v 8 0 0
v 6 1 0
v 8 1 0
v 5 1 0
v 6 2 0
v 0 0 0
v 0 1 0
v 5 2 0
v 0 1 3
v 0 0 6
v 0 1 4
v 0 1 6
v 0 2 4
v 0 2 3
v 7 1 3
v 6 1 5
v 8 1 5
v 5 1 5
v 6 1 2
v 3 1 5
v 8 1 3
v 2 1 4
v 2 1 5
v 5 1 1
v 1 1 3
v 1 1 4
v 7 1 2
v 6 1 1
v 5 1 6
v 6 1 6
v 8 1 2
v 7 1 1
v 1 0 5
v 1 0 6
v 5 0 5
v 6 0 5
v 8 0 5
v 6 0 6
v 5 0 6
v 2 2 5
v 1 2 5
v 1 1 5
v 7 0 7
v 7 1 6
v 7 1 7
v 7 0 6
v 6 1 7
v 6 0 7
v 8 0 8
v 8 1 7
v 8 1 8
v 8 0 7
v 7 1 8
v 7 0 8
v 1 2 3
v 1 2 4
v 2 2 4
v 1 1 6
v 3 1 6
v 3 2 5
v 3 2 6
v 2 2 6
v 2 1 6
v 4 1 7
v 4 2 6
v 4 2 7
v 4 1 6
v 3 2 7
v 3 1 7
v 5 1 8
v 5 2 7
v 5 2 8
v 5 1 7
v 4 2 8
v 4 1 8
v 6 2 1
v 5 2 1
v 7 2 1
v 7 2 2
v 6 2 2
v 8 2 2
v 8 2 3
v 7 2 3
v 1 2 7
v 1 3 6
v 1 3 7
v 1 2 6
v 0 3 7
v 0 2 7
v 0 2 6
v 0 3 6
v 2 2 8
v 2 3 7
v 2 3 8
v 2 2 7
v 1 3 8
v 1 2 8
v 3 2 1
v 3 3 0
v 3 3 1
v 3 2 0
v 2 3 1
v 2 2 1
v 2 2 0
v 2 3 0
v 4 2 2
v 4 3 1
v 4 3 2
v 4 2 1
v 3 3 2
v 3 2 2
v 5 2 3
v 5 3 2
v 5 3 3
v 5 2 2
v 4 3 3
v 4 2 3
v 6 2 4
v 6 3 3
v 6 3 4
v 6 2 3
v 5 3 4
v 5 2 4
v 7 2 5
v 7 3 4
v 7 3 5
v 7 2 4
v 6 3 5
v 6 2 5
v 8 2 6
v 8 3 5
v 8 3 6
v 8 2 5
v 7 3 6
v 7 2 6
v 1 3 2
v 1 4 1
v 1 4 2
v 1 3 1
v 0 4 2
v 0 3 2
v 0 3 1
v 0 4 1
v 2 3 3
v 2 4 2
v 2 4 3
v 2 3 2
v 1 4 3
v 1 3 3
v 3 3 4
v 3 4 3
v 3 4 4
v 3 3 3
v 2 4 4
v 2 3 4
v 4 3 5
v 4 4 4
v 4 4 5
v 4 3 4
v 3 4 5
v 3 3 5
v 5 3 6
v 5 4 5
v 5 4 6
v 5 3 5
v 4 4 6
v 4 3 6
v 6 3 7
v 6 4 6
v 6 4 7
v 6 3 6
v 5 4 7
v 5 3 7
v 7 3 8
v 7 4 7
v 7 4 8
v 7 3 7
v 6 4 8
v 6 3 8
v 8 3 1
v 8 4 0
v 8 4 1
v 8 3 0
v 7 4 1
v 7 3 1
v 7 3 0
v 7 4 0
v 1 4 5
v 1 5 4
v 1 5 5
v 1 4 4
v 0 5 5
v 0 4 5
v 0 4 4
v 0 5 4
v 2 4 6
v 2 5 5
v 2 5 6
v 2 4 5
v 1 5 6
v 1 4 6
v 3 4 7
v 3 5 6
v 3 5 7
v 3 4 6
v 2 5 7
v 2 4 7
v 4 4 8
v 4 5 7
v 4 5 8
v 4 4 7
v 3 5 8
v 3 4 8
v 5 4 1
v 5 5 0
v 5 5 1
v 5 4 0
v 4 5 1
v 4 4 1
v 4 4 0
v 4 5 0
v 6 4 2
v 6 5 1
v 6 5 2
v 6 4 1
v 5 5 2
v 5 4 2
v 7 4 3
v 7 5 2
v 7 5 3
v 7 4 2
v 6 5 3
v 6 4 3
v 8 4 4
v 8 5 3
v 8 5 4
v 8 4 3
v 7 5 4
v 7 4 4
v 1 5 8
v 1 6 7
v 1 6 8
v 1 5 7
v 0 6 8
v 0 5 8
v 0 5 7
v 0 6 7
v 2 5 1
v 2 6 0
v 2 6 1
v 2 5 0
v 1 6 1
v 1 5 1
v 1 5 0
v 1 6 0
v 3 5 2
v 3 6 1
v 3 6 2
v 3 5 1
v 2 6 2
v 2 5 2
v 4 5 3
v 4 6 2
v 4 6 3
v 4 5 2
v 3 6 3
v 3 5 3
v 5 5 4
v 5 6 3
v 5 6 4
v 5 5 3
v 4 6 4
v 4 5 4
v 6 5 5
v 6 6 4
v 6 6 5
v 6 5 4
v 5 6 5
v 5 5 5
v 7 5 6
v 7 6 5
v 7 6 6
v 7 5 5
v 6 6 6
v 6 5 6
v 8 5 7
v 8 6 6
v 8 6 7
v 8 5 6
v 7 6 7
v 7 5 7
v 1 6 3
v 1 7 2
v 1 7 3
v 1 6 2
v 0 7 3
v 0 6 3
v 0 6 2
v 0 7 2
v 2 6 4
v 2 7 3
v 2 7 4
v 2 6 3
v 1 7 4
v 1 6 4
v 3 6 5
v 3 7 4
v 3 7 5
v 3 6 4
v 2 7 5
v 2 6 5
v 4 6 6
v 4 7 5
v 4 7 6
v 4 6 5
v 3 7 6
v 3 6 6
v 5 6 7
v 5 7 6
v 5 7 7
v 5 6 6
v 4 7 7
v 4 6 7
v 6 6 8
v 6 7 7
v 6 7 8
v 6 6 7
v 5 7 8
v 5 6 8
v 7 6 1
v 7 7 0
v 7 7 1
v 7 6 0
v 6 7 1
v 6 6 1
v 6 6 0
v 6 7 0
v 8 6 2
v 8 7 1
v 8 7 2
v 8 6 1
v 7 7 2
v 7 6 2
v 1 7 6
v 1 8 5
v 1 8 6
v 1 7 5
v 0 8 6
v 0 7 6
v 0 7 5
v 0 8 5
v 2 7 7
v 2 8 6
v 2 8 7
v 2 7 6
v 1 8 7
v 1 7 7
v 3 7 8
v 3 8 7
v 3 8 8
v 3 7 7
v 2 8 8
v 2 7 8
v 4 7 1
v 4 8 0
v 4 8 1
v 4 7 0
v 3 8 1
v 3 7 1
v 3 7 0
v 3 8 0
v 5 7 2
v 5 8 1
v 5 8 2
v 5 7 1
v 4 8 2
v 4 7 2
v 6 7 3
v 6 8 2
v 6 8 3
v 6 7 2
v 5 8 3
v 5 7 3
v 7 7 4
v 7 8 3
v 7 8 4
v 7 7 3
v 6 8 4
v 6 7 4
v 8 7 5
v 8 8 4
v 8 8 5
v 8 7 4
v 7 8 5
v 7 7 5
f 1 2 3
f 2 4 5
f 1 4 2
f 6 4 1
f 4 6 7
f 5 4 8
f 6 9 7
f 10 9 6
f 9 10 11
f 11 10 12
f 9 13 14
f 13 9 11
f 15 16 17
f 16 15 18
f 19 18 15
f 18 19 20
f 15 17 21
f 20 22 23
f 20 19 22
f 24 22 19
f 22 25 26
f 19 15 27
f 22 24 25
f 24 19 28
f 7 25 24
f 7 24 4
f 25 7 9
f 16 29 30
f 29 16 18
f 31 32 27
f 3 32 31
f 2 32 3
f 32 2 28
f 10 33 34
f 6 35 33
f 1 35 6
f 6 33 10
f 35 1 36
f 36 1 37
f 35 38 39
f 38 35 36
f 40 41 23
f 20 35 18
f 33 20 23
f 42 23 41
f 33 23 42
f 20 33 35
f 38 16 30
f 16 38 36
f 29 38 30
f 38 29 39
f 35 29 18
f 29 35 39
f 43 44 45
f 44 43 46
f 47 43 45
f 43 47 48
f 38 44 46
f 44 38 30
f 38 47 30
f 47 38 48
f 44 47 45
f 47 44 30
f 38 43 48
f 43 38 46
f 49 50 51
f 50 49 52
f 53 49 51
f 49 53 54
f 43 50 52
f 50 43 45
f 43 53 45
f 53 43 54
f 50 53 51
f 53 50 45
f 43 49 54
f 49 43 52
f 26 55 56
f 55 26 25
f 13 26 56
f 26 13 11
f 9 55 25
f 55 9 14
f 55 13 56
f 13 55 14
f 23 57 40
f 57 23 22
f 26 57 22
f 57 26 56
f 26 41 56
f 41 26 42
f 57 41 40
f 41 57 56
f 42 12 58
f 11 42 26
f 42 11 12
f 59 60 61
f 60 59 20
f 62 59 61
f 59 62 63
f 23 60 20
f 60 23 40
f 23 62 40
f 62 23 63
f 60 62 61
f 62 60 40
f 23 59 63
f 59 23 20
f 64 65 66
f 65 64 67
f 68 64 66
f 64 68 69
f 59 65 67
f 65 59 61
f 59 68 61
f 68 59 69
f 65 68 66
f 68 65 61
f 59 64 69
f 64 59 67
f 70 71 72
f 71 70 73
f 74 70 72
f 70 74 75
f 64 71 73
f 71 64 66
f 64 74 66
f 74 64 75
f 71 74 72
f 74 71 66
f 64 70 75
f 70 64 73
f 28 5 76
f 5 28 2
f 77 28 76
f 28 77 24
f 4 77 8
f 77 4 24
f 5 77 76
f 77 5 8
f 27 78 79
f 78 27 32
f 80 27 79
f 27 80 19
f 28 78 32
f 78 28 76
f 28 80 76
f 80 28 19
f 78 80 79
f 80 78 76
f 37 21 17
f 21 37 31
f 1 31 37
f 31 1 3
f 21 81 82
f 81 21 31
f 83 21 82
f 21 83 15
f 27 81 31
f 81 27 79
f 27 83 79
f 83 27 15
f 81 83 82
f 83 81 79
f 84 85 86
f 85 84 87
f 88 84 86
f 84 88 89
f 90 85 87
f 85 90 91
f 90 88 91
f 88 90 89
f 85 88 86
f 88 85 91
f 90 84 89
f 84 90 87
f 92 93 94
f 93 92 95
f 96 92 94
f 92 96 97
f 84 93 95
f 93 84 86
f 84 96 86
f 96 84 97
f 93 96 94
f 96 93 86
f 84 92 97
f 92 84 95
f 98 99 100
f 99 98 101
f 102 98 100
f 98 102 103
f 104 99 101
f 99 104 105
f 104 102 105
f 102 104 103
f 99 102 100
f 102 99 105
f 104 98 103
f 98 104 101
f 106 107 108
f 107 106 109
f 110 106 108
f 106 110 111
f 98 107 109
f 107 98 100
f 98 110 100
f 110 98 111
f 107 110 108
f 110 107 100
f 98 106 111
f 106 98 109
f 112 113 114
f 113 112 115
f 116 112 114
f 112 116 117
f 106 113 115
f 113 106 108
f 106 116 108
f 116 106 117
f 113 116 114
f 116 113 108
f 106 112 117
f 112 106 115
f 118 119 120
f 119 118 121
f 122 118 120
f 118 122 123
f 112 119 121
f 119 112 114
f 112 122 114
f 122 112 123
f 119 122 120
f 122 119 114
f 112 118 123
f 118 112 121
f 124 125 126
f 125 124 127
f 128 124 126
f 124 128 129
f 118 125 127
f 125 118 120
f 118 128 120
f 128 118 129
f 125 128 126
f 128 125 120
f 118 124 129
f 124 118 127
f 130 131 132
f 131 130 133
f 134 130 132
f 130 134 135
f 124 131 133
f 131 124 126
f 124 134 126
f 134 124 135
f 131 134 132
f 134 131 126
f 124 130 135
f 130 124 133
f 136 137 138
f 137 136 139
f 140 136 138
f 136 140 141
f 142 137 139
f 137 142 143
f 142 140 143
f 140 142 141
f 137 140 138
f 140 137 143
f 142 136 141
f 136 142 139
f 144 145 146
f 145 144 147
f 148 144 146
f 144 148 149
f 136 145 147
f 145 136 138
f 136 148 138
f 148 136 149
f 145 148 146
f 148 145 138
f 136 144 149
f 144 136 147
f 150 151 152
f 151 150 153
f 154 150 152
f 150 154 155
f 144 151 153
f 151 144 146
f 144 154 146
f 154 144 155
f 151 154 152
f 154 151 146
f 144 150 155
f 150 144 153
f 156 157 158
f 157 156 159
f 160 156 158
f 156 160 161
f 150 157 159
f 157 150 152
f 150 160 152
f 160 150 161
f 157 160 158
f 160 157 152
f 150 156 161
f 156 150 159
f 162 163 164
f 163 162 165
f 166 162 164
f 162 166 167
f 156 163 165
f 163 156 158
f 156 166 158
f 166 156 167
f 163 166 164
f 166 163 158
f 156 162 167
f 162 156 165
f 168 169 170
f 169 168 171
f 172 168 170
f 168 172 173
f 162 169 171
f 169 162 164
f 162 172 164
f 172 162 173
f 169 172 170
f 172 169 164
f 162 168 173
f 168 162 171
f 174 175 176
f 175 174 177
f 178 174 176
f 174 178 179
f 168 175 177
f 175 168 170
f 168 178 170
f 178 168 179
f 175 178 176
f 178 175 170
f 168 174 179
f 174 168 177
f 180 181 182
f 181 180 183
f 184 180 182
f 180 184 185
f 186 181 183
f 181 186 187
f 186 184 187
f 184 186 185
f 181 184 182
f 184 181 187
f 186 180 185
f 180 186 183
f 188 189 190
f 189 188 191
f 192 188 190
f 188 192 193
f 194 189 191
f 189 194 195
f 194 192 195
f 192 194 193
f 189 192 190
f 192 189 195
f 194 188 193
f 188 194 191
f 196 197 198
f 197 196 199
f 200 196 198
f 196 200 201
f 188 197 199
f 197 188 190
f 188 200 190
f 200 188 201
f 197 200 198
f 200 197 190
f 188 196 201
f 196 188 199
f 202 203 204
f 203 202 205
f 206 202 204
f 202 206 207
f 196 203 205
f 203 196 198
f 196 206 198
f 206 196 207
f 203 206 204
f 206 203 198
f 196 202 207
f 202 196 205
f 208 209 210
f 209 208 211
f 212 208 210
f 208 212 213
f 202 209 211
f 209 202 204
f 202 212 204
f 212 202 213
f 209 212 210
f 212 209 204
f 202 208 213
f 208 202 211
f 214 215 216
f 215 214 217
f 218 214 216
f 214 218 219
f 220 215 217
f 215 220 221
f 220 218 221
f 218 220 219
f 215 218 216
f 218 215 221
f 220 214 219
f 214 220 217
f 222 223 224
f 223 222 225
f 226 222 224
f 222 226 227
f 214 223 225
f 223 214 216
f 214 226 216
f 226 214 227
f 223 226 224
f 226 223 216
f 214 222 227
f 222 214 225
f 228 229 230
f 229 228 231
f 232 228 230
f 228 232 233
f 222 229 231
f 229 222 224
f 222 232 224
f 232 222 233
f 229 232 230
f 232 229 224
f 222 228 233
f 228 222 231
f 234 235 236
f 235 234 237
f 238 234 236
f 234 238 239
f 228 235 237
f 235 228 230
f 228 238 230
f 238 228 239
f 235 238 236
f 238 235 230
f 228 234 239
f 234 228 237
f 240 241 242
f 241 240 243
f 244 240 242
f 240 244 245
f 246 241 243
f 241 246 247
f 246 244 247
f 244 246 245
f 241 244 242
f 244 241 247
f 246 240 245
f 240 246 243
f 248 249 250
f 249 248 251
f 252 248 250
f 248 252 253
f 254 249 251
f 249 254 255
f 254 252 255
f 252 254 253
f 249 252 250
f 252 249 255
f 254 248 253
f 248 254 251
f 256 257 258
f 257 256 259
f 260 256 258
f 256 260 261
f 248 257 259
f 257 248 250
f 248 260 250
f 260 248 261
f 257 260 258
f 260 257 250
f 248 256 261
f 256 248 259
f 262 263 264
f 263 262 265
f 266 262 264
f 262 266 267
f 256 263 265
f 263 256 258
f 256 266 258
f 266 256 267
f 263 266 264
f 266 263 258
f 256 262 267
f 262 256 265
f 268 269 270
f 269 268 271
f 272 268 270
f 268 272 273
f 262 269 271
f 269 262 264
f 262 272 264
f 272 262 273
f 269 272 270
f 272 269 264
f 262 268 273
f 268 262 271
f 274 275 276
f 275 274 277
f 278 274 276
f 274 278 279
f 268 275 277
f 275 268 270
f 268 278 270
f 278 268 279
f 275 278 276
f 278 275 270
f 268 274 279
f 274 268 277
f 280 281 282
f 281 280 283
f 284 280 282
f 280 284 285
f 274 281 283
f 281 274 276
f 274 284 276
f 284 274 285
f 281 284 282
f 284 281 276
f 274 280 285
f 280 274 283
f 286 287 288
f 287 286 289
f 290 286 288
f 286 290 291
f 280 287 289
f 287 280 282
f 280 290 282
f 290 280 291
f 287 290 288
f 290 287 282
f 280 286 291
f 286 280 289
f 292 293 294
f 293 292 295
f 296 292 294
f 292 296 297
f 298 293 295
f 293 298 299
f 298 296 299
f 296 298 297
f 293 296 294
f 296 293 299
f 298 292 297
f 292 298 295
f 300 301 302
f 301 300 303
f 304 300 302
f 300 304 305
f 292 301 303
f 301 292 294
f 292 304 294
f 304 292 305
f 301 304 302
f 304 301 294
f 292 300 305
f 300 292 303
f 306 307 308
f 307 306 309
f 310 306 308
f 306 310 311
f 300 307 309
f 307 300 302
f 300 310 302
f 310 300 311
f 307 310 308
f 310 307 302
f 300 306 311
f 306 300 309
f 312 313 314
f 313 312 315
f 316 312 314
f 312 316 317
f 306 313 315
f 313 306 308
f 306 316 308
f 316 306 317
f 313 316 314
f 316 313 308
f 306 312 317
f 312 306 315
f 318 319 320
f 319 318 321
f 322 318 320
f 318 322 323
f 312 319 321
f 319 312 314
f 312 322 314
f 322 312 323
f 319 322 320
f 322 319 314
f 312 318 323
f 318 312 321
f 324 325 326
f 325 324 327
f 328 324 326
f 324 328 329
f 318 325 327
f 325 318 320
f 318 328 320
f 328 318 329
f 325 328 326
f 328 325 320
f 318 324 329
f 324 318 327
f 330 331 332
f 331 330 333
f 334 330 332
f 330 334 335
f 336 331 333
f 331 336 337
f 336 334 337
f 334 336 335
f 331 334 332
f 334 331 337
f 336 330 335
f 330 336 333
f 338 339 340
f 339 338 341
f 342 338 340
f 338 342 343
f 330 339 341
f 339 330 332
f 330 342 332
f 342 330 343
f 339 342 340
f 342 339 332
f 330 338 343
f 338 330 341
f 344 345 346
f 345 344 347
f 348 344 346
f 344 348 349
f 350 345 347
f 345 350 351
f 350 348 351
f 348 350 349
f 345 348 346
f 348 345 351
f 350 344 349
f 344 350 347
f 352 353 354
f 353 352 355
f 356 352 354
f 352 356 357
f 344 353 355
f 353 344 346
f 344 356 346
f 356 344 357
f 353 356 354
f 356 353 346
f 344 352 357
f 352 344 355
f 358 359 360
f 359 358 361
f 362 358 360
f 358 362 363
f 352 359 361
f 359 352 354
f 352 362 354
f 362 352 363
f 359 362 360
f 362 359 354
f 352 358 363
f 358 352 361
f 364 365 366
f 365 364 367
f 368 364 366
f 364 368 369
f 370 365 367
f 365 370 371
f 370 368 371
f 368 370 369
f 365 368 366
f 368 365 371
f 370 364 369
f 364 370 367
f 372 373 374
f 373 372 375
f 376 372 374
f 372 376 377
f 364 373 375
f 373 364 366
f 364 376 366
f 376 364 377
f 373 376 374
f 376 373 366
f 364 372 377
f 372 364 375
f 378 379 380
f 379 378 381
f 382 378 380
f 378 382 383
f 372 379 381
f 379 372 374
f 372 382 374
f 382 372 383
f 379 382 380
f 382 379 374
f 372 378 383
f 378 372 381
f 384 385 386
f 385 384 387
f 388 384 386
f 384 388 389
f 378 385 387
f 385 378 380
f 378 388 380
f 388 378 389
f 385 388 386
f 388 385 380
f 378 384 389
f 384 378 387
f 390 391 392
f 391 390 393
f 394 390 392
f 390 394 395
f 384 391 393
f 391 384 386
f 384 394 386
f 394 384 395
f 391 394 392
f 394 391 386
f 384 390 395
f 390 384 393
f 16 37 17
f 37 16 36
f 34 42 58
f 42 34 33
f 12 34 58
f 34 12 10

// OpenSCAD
union() {
    translate([0, 0, 0]) cube([1, 1, 1]);
    translate([1, 0, 1]) cube([1, 1, 1]);
    translate([2, 0, 2]) cube([1, 1, 1]);
    translate([3, 0, 3]) cube([1, 1, 1]);
    translate([4, 0, 4]) cube([1, 1, 1]);
    translate([5, 0, 5]) cube([1, 1, 1]);
    translate([6, 0, 6]) cube([1, 1, 1]);
    translate([7, 0, 7]) cube([1, 1, 1]);
    translate([0, 1, 3]) cube([1, 1, 1]);
    translate([1, 1, 4]) cube([1, 1, 1]);
    translate([2, 1, 5]) cube([1, 1, 1]);
    translate([3, 1, 6]) cube([1, 1, 1]);
    translate([4, 1, 7]) cube([1, 1, 1]);
    translate([5, 1, 0]) cube([1, 1, 1]);
    translate([6, 1, 1]) cube([1, 1, 1]);
    translate([7, 1, 2]) cube([1, 1, 1]);
    translate([0, 2, 6]) cube([1, 1, 1]);
    translate([1, 2, 7]) cube([1, 1, 1]);
    translate([2, 2, 0]) cube([1, 1, 1]);
    translate([3, 2, 1]) cube([1, 1, 1]);
    translate([4, 2, 2]) cube([1, 1, 1]);
    translate([5, 2, 3]) cube([1, 1, 1]);
    translate([6, 2, 4]) cube([1, 1, 1]);
    translate([7, 2, 5]) cube([1, 1, 1]);
    translate([0, 3, 1]) cube([1, 1, 1]);
    translate([1, 3, 2]) cube([1, 1, 1]);
    translate([2, 3, 3]) cube([1, 1, 1]);
    translate([3, 3, 4]) cube([1, 1, 1]);
    translate([4, 3, 5]) cube([1, 1, 1]);
    translate([5, 3, 6]) cube([1, 1, 1]);
    translate([6, 3, 7]) cube([1, 1, 1]);
    translate([7, 3, 0]) cube([1, 1, 1]);
    translate([0, 4, 4]) cube([1, 1, 1]);
    translate([1, 4, 5]) cube([1, 1, 1]);
    translate([2, 4, 6]) cube([1, 1, 1]);
    translate([3, 4, 7]) cube([1, 1, 1]);
    translate([4, 4, 0]) cube([1, 1, 1]);
    translate([5, 4, 1]) cube([1, 1, 1]);
    translate([6, 4, 2]) cube([1, 1, 1]);
    translate([7, 4, 3]) cube([1, 1, 1]);
    translate([0, 5, 7]) cube([1, 1, 1]);
    translate([1, 5, 0]) cube([1, 1, 1]);
    translate([2, 5, 1]) cube([1, 1, 1]);
    translate([3, 5, 2]) cube([1, 1, 1]);
    translate([4, 5, 3]) cube([1, 1, 1]);
    translate([5, 5, 4]) cube([1, 1, 1]);
    translate([6, 5, 5]) cube([1, 1, 1]);
    translate([7, 5, 6]) cube([1, 1, 1]);
    translate([0, 6, 2]) cube([1, 1, 1]);
    translate([1, 6, 3]) cube([1, 1, 1]);
    translate([2, 6, 4]) cube([1, 1, 1]);
    translate([3, 6, 5]) cube([1, 1, 1]);
    translate([4, 6, 6]) cube([1, 1, 1]);
    translate([5, 6, 7]) cube([1, 1, 1]);
    translate([6, 6, 0]) cube([1, 1, 1]);
    translate([7, 6, 1]) cube([1, 1, 1]);
    translate([0, 7, 5]) cube([1, 1, 1]);
    translate([1, 7, 6]) cube([1, 1, 1]);
    translate([2, 7, 7]) cube([1, 1, 1]);
    translate([3, 7, 0]) cube([1, 1, 1]);
    translate([4, 7, 1]) cube([1, 1, 1]);
    translate([5, 7, 2]) cube([1, 1, 1]);
    translate([6, 7, 3]) cube([1, 1, 1]);
    translate([7, 7, 4]) cube([1, 1, 1]);
    translate([1, 0, 0]) cube([1, 1, 1]);
    translate([2, 0, 0]) cube([1, 1, 1]);
    translate([3, 0, 0]) cube([1, 1, 1]);
    translate([4, 0, 0]) cube([1, 1, 1]);
    translate([5, 0, 0]) cube([1, 1, 1]);
    translate([6, 0, 0]) cube([1, 1, 1]);
    translate([7, 0, 0]) cube([1, 1, 1]);
    translate([0, 0, 1]) cube([1, 1, 1]);
    translate([2, 0, 1]) cube([1, 1, 1]);
    translate([3, 0, 1]) cube([1, 1, 1]);
    translate([4, 0, 1]) cube([1, 1, 1]);
    translate([5, 0, 1]) cube([1, 1, 1]);
    translate([6, 0, 1]) cube([1, 1, 1]);
    translate([7, 0, 1]) cube([1, 1, 1]);
    translate([0, 0, 2]) cube([1, 1, 1]);
    translate([1, 0, 2]) cube([1, 1, 1]);
    translate([3, 0, 2]) cube([1, 1, 1]);
    translate([4, 0, 2]) cube([1, 1, 1]);
    translate([5, 0, 2]) cube([1, 1, 1]);
    translate([6, 0, 2]) cube([1, 1, 1]);
    translate([7, 0, 2]) cube([1, 1, 1]);
    translate([0, 0, 3]) cube([1, 1, 1]);
    translate([1, 0, 3]) cube([1, 1, 1]);
    translate([2, 0, 3]) cube([1, 1, 1]);
    translate([4, 0, 3]) cube([1, 1, 1]);
    translate([5, 0, 3]) cube([1, 1, 1]);
    translate([6, 0, 3]) cube([1, 1, 1]);
    translate([7, 0, 3]) cube([1, 1, 1]);
    translate([0, 0, 4]) cube([1, 1, 1]);
    translate([1, 0, 4]) cube([1, 1, 1]);
    translate([2, 0, 4]) cube([1, 1, 1]);
    translate([3, 0, 4]) cube([1, 1, 1]);
    translate([5, 0, 4]) cube([1, 1, 1]);
    translate([6, 0, 4]) cube([1, 1, 1]);
    translate([7, 0, 4]) cube([1, 1, 1]);
    translate([0, 0, 5]) cube([1, 1, 1]);
}
